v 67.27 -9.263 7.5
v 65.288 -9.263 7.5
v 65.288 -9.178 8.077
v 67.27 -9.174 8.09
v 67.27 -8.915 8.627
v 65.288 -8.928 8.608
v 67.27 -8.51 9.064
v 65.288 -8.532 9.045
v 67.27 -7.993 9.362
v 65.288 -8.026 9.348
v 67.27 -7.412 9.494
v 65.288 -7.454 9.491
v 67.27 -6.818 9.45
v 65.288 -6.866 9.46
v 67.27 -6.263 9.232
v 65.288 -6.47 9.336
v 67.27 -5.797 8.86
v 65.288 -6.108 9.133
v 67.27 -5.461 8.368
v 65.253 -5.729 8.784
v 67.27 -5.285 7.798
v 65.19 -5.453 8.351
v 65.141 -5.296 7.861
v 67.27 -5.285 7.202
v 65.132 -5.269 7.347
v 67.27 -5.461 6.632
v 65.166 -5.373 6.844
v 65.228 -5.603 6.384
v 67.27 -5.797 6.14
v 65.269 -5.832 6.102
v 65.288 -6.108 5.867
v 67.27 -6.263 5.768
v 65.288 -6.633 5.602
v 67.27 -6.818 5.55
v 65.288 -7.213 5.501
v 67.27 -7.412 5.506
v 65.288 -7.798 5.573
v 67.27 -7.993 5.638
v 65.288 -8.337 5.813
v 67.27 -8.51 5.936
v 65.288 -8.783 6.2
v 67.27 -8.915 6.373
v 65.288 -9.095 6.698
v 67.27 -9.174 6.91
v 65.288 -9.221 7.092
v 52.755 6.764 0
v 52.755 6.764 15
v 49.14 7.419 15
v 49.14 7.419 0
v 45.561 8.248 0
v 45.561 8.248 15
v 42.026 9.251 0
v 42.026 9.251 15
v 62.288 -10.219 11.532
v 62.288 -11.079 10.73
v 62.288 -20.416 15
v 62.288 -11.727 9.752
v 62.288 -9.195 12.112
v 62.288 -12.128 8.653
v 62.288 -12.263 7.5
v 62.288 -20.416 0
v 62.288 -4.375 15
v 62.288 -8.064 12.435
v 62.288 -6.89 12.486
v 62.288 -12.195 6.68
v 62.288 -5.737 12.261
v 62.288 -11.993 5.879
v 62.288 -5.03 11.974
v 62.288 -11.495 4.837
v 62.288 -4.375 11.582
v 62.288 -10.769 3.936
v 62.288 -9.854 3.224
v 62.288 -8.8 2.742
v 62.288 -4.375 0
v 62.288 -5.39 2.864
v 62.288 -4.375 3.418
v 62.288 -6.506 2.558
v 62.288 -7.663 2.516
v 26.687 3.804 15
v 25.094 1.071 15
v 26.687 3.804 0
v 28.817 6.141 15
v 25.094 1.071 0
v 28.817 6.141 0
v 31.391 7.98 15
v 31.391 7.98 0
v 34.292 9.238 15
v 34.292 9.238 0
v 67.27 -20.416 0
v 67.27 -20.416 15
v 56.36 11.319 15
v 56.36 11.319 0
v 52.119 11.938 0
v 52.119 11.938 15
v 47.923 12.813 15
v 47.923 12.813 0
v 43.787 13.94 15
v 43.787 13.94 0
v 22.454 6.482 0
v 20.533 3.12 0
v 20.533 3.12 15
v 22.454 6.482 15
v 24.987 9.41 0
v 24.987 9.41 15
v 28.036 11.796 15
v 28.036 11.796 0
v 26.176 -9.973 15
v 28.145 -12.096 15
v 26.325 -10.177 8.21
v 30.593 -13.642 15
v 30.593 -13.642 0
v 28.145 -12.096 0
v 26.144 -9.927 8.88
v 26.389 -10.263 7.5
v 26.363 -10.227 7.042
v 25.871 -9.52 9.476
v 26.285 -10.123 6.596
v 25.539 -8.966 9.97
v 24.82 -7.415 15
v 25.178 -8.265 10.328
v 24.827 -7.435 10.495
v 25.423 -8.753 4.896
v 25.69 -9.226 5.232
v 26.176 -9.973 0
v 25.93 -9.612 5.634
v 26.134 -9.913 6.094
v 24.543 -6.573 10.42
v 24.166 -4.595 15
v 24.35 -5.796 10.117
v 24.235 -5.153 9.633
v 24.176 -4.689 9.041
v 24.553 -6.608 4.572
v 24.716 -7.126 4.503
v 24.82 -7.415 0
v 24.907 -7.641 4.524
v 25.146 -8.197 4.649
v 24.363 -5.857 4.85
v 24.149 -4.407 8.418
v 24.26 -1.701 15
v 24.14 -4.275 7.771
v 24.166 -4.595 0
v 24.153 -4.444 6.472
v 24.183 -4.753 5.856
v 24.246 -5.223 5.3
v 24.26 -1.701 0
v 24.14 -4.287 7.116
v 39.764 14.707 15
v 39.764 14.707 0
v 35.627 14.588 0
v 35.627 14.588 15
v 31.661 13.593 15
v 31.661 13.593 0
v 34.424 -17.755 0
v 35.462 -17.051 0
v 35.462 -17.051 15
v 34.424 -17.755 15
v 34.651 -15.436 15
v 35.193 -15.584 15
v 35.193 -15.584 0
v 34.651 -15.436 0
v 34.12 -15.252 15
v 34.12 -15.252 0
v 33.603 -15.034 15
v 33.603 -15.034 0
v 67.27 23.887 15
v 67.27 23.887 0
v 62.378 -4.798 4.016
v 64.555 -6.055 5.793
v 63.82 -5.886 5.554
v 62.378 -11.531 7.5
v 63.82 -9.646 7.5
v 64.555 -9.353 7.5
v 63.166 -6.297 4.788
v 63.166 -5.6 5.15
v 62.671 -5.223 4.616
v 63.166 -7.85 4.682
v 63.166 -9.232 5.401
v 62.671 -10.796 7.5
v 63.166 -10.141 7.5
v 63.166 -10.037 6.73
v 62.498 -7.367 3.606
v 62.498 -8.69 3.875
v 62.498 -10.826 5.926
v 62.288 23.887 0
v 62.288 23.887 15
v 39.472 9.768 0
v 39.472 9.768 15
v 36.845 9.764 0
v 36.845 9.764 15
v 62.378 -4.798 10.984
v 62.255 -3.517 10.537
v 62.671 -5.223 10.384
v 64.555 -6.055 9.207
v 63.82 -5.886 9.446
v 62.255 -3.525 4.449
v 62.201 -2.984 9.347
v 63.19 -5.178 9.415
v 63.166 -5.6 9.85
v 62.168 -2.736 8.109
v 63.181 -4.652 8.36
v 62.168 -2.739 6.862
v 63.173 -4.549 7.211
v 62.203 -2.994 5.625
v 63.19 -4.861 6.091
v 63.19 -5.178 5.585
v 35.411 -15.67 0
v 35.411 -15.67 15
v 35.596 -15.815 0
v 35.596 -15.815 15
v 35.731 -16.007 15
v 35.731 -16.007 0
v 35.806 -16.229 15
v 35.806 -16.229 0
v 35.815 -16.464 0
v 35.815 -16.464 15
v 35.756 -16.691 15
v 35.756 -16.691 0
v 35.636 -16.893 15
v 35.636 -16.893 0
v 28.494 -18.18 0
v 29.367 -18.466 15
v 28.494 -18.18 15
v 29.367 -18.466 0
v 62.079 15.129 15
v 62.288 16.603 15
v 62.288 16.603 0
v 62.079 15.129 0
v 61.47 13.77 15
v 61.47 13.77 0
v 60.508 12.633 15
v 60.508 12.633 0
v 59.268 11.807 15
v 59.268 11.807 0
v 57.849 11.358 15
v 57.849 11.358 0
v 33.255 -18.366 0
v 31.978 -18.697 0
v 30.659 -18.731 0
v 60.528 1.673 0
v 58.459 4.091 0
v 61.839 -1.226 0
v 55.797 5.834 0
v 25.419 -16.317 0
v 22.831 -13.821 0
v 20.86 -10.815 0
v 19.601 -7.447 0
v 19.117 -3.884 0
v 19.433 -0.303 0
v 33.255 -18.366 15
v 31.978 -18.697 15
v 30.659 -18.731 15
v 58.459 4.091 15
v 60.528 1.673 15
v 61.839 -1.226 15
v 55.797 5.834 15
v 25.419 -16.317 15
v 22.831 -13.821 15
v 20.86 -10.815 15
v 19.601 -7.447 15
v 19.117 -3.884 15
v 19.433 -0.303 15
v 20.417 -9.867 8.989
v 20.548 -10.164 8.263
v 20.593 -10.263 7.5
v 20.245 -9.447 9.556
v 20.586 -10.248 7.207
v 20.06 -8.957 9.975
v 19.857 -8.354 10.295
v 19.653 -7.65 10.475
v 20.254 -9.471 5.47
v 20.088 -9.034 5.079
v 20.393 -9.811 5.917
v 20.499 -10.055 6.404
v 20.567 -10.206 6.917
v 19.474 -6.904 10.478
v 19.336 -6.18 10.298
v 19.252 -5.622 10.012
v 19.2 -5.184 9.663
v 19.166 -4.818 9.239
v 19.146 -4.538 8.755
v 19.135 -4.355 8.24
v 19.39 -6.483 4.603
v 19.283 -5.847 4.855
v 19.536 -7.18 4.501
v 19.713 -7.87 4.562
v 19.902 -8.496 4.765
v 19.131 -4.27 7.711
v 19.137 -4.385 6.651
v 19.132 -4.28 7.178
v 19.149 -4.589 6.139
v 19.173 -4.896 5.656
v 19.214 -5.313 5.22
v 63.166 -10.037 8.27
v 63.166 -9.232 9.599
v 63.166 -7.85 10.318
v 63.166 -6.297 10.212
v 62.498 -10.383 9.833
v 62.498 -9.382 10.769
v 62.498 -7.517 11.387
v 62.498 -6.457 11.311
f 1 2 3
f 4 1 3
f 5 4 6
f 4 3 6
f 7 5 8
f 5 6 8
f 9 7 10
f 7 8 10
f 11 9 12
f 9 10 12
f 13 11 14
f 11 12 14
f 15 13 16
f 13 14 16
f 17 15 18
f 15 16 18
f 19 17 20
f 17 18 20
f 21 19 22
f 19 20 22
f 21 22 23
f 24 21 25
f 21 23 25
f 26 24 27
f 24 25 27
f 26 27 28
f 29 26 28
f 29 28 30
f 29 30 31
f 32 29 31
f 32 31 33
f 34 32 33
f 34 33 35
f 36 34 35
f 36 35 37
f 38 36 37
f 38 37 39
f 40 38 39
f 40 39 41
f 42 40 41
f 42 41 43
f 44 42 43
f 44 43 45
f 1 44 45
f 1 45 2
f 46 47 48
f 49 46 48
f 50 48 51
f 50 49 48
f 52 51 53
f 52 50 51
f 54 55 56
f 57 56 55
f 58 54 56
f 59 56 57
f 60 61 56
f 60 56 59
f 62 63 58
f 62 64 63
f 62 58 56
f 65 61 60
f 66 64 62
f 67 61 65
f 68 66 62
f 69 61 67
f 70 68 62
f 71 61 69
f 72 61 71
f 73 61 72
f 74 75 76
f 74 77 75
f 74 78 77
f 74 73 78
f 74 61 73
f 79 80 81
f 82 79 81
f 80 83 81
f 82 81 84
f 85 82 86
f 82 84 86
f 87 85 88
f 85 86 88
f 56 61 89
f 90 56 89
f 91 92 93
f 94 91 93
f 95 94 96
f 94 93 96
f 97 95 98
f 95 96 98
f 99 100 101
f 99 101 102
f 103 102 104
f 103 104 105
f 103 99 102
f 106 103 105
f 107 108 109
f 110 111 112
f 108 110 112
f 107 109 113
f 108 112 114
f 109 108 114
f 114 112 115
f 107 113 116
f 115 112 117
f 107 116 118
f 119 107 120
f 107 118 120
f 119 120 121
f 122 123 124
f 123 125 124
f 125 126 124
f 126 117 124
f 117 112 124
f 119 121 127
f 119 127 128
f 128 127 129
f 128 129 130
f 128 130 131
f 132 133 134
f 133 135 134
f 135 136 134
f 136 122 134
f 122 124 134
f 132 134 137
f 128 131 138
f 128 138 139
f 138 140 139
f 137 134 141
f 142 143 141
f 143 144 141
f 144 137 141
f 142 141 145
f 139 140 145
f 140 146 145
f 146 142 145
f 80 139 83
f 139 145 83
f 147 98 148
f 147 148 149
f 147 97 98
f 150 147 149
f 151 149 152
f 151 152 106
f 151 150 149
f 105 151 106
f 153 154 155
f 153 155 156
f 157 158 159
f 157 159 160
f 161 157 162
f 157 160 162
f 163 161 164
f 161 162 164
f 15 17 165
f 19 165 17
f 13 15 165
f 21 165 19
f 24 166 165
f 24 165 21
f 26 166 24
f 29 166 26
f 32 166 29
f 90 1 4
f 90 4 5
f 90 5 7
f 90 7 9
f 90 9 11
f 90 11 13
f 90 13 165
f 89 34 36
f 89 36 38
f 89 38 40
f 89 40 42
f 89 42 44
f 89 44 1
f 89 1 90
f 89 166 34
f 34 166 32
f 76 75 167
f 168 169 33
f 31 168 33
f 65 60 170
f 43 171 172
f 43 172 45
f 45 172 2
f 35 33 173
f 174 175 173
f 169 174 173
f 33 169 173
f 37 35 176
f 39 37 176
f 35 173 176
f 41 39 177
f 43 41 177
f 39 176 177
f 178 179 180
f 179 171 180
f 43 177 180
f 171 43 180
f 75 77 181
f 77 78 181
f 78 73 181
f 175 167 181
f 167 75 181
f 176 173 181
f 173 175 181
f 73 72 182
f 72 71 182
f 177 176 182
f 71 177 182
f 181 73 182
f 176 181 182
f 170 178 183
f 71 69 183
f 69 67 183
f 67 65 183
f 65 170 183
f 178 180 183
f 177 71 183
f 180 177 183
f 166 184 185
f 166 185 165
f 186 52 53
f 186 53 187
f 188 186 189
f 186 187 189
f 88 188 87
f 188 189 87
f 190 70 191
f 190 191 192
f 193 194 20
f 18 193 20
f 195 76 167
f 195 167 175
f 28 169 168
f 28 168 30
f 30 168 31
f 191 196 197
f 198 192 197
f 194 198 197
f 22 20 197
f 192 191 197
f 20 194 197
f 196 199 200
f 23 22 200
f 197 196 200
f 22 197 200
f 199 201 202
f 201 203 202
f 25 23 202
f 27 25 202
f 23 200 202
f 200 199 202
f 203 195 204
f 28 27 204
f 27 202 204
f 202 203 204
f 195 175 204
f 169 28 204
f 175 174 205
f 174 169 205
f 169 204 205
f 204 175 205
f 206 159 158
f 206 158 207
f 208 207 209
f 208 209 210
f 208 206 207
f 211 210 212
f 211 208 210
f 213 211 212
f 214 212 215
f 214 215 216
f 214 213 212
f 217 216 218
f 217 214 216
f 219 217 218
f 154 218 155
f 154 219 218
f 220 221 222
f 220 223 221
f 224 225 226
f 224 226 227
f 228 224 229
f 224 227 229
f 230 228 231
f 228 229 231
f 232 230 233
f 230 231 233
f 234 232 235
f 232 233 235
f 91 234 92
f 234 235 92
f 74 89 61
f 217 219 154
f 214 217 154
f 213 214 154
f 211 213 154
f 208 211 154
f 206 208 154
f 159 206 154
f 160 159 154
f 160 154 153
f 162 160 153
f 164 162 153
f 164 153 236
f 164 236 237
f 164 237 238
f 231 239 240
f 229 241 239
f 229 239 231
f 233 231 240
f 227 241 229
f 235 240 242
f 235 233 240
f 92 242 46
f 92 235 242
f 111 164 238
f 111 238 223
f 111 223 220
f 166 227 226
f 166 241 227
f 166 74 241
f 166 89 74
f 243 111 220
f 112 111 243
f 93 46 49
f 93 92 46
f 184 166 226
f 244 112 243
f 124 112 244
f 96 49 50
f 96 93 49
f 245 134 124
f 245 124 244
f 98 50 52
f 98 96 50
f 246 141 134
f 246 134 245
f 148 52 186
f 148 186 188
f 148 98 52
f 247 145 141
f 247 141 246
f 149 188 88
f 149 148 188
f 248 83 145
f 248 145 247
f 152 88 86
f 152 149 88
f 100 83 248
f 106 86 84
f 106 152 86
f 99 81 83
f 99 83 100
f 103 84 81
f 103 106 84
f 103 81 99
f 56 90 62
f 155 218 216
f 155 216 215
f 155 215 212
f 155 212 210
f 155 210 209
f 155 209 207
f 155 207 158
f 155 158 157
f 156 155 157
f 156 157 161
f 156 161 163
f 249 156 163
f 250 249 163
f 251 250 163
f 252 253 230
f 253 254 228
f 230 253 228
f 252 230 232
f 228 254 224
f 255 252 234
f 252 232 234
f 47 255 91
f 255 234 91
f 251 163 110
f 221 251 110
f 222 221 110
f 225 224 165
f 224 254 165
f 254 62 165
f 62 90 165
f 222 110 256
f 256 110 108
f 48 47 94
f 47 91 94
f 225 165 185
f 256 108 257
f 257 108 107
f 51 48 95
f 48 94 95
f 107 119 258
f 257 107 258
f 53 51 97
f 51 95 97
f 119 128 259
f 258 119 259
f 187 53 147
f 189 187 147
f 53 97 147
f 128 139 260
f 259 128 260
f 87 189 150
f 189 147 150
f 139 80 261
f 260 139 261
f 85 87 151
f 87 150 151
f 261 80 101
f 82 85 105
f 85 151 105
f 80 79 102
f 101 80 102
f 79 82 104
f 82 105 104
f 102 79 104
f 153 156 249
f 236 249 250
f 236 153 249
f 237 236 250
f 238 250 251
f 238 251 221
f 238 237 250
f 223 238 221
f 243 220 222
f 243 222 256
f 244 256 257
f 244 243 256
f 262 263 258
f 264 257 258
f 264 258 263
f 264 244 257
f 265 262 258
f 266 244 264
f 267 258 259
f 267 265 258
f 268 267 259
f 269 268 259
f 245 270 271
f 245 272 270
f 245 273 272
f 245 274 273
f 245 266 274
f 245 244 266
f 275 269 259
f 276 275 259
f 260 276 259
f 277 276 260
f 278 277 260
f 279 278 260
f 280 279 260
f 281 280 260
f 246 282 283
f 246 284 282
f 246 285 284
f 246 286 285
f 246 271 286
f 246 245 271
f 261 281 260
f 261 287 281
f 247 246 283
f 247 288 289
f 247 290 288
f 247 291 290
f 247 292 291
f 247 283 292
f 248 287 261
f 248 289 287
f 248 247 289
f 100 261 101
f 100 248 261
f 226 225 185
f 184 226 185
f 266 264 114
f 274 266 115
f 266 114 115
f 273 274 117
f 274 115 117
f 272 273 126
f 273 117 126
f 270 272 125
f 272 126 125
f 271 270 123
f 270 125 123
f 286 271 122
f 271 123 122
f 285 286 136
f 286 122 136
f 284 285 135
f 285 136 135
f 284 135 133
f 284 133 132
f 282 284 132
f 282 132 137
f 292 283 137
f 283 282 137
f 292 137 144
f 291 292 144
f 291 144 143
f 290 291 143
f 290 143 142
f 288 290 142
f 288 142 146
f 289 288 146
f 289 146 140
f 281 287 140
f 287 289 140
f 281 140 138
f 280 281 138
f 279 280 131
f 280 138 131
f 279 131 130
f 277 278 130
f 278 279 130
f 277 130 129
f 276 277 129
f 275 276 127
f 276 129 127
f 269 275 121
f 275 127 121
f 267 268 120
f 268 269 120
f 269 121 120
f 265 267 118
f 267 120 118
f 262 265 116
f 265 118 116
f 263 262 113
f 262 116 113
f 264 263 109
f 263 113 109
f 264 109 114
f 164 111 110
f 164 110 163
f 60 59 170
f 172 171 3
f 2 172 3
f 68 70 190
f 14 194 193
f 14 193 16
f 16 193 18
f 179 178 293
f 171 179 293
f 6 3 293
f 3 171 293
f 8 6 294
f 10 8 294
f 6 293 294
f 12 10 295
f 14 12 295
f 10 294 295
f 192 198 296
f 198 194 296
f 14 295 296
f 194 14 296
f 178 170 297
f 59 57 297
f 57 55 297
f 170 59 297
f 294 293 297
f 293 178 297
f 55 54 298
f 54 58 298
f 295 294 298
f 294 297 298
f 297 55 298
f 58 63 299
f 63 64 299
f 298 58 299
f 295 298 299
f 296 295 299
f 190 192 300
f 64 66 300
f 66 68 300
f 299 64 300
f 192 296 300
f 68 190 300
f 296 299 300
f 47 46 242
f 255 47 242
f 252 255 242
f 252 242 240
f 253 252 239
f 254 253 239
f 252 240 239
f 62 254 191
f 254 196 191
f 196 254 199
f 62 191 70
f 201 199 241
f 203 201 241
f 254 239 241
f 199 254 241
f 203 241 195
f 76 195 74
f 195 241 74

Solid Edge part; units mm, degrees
sketch "Sketch1" plane through (0, 0, 0) normal (0, 0, 1) x (1, 0, 0)
  line L0 (62.2876, -20.4159) -> (62.2876, -4.3754)
  arc A0 (52.7547, 6.7636) -> (62.2876, -4.3754) centre (51.0132, -4.3754) cw
  arc A1 (40.1391, 9.8624) -> (52.7547, 6.7636) centre (64.4659, 81.6715) ccw
  arc A2 (25.0937, 1.0714) -> (30.5929, -13.6417) centre (35.281, -3.5053) ccw
  line L1 (30.5929, -13.6417) -> (33.6031, -15.0339)
  arc A3 (33.6031, -15.0339) -> (35.1927, -15.5836) centre (37.1297, -7.4088) ccw
  arc A4 (35.1927, -15.5836) -> (35.4622, -17.051) centre (35.0049, -16.3765) cw
  line L2 (35.4622, -17.051) -> (34.4237, -17.755)
  arc A5 (34.4237, -17.755) -> (29.3666, -18.4657) centre (31.171, -12.9576) cw
  line L3 (29.3666, -18.4657) -> (28.4941, -18.1799)
  arc A6 (20.5329, 3.1204) -> (28.4941, -18.1799) centre (35.281, -3.5053) ccw
  arc A7 (20.5329, 3.1204) -> (41.2336, 14.7729) centre (38.7764, -5.0756) cw
  arc A8 (41.2336, 14.7729) -> (56.3598, 11.3191) centre (64.4659, 81.6715) ccw
  arc A9 (56.3598, 11.3191) -> (62.2876, 16.6032) centre (56.9686, 16.6032) ccw
  line L4 (62.2876, 16.6032) -> (62.2876, 23.8866)
  line L5 (62.2876, 23.8866) -> (67.2703, 23.8866)
  line L6 (67.2703, 23.8866) -> (67.2703, -20.4159)
  line L7 (62.2876, -20.4159) -> (67.2703, -20.4159)
  arc A10 (25.0938, 1.0714) -> (40.1391, 9.8624) centre (38.7764, -5.0756) cw
extrude "Protrusion1" add sketch "Sketch1" along normal blind 15
sketch "Sketch2" plane through (62.2876, -7.2627, 12.5) normal (-1, 0, 0) x (0, -1, 0)
  circle A0 centre (0, -5) radius 2
extrude "ScavoEstrusione_1" cut sketch "Sketch2" along normal mid plane 363.09
sketch "Sketch3" plane through (62.2876, -7.2627, 12.5) normal (-1, 0, 0) x (0, -1, 0)
  circle A0 centre (0, -5) radius 3
extrude "ScavoEstrusione_2" cut sketch "Sketch3" along normal blind 211.9198
fillet "Rotondo_1" radius 3 1 edges at (62.2876, -7.2627, 5.5)
fillet "Rotondo_3" radius 13 1 edges at (40.1391, 9.8624, 7.5)
fillet "Rotondo_4" radius 19 1 edges at (41.2336, 14.7729, 7.5)
